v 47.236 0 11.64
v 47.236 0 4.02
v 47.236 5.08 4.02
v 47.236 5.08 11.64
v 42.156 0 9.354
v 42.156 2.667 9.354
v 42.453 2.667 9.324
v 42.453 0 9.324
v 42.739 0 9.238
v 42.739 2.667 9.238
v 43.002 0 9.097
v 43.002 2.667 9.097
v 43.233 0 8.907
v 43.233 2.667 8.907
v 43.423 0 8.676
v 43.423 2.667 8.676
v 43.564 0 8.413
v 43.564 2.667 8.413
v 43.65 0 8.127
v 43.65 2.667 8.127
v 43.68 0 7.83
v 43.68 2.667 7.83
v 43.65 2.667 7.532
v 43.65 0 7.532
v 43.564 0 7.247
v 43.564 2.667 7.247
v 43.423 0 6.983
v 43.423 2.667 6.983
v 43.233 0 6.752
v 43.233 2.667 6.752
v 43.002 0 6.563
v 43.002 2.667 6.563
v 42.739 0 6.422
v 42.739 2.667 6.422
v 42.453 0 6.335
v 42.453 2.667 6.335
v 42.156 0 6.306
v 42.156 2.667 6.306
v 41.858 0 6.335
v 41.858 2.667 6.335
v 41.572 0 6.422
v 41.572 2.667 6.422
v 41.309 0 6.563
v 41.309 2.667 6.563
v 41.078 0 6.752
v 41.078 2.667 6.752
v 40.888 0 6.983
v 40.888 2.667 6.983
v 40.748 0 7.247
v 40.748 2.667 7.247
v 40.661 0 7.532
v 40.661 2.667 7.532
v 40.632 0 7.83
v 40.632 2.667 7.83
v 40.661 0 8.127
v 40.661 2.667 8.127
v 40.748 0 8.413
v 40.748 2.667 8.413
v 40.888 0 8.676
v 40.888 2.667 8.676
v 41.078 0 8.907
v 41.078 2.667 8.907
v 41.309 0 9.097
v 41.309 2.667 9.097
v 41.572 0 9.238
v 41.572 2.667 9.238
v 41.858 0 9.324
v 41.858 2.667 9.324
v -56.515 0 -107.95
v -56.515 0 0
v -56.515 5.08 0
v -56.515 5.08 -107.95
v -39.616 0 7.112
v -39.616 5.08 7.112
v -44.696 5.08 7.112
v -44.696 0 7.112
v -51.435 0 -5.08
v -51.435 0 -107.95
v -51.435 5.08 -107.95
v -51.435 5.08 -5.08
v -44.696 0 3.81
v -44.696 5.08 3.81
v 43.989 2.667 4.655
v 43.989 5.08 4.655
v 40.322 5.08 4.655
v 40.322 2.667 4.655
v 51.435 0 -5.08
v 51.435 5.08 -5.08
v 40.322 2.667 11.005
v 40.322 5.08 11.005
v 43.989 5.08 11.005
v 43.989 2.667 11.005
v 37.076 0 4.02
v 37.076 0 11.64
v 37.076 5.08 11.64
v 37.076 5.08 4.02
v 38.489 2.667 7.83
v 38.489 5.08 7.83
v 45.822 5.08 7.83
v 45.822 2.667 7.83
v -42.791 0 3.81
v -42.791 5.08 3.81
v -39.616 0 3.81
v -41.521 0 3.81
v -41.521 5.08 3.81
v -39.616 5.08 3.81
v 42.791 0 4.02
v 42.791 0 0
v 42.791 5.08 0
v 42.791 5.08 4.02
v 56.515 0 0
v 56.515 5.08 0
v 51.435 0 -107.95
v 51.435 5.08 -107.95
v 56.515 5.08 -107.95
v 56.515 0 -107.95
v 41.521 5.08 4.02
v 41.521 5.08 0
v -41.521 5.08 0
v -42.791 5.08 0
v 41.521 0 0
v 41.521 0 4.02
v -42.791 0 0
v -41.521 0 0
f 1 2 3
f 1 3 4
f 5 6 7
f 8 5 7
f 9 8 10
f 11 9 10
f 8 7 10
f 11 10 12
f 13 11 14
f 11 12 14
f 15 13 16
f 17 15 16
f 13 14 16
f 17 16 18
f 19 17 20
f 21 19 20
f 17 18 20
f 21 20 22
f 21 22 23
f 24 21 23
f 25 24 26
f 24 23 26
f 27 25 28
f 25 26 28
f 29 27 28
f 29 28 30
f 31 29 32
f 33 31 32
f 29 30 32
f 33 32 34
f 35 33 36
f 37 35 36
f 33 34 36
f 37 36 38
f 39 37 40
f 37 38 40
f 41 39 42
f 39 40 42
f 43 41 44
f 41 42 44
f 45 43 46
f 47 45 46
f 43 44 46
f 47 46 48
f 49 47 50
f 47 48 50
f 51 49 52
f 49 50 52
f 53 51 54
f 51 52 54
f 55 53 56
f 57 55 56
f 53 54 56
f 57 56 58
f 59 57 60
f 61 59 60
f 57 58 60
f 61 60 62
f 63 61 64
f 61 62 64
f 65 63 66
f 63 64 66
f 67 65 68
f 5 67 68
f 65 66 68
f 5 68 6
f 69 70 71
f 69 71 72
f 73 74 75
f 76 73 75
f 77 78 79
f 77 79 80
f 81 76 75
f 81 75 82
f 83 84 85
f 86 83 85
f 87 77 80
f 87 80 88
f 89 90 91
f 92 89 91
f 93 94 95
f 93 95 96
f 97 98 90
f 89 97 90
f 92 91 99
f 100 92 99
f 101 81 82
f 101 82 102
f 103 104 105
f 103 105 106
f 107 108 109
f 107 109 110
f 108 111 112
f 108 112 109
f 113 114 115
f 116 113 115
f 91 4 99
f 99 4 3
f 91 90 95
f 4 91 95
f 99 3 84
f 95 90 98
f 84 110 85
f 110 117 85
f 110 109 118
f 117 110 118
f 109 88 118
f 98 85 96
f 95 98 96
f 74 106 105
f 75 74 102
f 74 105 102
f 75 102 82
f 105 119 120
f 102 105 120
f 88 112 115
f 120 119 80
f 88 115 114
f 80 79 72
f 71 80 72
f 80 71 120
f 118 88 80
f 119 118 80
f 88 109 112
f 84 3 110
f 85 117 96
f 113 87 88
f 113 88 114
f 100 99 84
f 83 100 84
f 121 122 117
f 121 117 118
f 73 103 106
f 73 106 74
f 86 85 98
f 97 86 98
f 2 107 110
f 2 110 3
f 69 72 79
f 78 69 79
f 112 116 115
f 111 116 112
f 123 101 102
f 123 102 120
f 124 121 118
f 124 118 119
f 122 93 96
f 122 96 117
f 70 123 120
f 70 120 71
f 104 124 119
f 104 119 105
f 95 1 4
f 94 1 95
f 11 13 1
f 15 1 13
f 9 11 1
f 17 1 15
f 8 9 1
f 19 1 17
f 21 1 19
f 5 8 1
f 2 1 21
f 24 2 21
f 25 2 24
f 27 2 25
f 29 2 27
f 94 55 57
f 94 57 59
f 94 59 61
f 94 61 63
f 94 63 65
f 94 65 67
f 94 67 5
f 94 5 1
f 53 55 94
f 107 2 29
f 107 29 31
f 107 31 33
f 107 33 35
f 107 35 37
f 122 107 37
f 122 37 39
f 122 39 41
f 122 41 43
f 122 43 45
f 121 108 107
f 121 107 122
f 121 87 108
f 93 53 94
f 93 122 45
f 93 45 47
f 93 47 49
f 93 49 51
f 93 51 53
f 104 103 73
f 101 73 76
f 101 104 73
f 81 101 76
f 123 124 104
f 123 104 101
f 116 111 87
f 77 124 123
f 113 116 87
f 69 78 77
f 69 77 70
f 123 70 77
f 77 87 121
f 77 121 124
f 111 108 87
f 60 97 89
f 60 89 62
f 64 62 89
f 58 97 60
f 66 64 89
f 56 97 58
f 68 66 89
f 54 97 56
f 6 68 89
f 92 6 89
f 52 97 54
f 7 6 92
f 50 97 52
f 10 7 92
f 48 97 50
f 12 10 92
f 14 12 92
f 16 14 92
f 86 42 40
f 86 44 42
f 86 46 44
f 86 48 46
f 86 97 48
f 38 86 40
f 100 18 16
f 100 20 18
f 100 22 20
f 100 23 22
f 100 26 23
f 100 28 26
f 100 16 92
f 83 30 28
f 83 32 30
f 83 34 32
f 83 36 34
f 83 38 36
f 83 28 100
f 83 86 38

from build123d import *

# Parameters (mm, degrees)
BOSS_EXTRUDE1_DEPTH = 5.08
CUT_EXTRUDE1_DEPTH  = 2.413
SKETCH8_R           = 1.524
CUT_EXTRUDE2_DEPTH  = 2.667


with BuildPart() as part:
    # Sketch1 → Boss-Extrude1 (new body)
    with BuildSketch(Plane(origin=(0, 0, 0), x_dir=(1, 0, 0), z_dir=(0, 1, 0))):
        Polygon((41.520544409, 0), (-41.520544409, 0), (-41.520544409, -3.81), (-39.615544409, -3.81), (-39.615544409, -7.112), (-44.695544409, -7.112), (-44.695544409, -3.81), (-42.790544409, -3.81), (-42.790544409, 0), (-56.515, 0), (-56.515, 107.95), (-51.435, 107.95), (-51.435, 5.08), (51.435, 5.08), (51.435, 107.95), (56.515, 107.95), (56.515, 0), (42.790544409, 0), (42.790544409, -4.019776581), (47.235544409, -4.019776581), (47.235544409, -11.639776581), (37.075544409, -11.639776581), (37.075544409, -4.019776581), (41.520544409, -4.019776581), align=None)
    extrude(amount=BOSS_EXTRUDE1_DEPTH)

    # Sketch2 → Cut-Extrude1 (cut)
    with BuildSketch(Plane(origin=(0, 5.08, 0), x_dir=(1, 0, 0), z_dir=(0, 1, 0))):
        Polygon((40.322457304, -4.654776581), (38.4893702, -7.829776581), (40.322457304, -11.004776581), (43.988631514, -11.004776581), (45.821718619, -7.829776581), (43.988631514, -4.654776581), align=None)
    extrude(amount=-CUT_EXTRUDE1_DEPTH, mode=Mode.SUBTRACT)

    # Sketch8 → Cut-Extrude2 (cut)
    with BuildSketch(Plane(origin=(0, 2.667, 0), x_dir=(1, 0, 0), z_dir=(0, 1, 0))):
        with Locations(Location((42.155544409, -7.829776581, 0), (0, 0, 270))):
            Circle(SKETCH8_R)
    extrude(amount=-CUT_EXTRUDE2_DEPTH, mode=Mode.SUBTRACT)


solid = part.part
